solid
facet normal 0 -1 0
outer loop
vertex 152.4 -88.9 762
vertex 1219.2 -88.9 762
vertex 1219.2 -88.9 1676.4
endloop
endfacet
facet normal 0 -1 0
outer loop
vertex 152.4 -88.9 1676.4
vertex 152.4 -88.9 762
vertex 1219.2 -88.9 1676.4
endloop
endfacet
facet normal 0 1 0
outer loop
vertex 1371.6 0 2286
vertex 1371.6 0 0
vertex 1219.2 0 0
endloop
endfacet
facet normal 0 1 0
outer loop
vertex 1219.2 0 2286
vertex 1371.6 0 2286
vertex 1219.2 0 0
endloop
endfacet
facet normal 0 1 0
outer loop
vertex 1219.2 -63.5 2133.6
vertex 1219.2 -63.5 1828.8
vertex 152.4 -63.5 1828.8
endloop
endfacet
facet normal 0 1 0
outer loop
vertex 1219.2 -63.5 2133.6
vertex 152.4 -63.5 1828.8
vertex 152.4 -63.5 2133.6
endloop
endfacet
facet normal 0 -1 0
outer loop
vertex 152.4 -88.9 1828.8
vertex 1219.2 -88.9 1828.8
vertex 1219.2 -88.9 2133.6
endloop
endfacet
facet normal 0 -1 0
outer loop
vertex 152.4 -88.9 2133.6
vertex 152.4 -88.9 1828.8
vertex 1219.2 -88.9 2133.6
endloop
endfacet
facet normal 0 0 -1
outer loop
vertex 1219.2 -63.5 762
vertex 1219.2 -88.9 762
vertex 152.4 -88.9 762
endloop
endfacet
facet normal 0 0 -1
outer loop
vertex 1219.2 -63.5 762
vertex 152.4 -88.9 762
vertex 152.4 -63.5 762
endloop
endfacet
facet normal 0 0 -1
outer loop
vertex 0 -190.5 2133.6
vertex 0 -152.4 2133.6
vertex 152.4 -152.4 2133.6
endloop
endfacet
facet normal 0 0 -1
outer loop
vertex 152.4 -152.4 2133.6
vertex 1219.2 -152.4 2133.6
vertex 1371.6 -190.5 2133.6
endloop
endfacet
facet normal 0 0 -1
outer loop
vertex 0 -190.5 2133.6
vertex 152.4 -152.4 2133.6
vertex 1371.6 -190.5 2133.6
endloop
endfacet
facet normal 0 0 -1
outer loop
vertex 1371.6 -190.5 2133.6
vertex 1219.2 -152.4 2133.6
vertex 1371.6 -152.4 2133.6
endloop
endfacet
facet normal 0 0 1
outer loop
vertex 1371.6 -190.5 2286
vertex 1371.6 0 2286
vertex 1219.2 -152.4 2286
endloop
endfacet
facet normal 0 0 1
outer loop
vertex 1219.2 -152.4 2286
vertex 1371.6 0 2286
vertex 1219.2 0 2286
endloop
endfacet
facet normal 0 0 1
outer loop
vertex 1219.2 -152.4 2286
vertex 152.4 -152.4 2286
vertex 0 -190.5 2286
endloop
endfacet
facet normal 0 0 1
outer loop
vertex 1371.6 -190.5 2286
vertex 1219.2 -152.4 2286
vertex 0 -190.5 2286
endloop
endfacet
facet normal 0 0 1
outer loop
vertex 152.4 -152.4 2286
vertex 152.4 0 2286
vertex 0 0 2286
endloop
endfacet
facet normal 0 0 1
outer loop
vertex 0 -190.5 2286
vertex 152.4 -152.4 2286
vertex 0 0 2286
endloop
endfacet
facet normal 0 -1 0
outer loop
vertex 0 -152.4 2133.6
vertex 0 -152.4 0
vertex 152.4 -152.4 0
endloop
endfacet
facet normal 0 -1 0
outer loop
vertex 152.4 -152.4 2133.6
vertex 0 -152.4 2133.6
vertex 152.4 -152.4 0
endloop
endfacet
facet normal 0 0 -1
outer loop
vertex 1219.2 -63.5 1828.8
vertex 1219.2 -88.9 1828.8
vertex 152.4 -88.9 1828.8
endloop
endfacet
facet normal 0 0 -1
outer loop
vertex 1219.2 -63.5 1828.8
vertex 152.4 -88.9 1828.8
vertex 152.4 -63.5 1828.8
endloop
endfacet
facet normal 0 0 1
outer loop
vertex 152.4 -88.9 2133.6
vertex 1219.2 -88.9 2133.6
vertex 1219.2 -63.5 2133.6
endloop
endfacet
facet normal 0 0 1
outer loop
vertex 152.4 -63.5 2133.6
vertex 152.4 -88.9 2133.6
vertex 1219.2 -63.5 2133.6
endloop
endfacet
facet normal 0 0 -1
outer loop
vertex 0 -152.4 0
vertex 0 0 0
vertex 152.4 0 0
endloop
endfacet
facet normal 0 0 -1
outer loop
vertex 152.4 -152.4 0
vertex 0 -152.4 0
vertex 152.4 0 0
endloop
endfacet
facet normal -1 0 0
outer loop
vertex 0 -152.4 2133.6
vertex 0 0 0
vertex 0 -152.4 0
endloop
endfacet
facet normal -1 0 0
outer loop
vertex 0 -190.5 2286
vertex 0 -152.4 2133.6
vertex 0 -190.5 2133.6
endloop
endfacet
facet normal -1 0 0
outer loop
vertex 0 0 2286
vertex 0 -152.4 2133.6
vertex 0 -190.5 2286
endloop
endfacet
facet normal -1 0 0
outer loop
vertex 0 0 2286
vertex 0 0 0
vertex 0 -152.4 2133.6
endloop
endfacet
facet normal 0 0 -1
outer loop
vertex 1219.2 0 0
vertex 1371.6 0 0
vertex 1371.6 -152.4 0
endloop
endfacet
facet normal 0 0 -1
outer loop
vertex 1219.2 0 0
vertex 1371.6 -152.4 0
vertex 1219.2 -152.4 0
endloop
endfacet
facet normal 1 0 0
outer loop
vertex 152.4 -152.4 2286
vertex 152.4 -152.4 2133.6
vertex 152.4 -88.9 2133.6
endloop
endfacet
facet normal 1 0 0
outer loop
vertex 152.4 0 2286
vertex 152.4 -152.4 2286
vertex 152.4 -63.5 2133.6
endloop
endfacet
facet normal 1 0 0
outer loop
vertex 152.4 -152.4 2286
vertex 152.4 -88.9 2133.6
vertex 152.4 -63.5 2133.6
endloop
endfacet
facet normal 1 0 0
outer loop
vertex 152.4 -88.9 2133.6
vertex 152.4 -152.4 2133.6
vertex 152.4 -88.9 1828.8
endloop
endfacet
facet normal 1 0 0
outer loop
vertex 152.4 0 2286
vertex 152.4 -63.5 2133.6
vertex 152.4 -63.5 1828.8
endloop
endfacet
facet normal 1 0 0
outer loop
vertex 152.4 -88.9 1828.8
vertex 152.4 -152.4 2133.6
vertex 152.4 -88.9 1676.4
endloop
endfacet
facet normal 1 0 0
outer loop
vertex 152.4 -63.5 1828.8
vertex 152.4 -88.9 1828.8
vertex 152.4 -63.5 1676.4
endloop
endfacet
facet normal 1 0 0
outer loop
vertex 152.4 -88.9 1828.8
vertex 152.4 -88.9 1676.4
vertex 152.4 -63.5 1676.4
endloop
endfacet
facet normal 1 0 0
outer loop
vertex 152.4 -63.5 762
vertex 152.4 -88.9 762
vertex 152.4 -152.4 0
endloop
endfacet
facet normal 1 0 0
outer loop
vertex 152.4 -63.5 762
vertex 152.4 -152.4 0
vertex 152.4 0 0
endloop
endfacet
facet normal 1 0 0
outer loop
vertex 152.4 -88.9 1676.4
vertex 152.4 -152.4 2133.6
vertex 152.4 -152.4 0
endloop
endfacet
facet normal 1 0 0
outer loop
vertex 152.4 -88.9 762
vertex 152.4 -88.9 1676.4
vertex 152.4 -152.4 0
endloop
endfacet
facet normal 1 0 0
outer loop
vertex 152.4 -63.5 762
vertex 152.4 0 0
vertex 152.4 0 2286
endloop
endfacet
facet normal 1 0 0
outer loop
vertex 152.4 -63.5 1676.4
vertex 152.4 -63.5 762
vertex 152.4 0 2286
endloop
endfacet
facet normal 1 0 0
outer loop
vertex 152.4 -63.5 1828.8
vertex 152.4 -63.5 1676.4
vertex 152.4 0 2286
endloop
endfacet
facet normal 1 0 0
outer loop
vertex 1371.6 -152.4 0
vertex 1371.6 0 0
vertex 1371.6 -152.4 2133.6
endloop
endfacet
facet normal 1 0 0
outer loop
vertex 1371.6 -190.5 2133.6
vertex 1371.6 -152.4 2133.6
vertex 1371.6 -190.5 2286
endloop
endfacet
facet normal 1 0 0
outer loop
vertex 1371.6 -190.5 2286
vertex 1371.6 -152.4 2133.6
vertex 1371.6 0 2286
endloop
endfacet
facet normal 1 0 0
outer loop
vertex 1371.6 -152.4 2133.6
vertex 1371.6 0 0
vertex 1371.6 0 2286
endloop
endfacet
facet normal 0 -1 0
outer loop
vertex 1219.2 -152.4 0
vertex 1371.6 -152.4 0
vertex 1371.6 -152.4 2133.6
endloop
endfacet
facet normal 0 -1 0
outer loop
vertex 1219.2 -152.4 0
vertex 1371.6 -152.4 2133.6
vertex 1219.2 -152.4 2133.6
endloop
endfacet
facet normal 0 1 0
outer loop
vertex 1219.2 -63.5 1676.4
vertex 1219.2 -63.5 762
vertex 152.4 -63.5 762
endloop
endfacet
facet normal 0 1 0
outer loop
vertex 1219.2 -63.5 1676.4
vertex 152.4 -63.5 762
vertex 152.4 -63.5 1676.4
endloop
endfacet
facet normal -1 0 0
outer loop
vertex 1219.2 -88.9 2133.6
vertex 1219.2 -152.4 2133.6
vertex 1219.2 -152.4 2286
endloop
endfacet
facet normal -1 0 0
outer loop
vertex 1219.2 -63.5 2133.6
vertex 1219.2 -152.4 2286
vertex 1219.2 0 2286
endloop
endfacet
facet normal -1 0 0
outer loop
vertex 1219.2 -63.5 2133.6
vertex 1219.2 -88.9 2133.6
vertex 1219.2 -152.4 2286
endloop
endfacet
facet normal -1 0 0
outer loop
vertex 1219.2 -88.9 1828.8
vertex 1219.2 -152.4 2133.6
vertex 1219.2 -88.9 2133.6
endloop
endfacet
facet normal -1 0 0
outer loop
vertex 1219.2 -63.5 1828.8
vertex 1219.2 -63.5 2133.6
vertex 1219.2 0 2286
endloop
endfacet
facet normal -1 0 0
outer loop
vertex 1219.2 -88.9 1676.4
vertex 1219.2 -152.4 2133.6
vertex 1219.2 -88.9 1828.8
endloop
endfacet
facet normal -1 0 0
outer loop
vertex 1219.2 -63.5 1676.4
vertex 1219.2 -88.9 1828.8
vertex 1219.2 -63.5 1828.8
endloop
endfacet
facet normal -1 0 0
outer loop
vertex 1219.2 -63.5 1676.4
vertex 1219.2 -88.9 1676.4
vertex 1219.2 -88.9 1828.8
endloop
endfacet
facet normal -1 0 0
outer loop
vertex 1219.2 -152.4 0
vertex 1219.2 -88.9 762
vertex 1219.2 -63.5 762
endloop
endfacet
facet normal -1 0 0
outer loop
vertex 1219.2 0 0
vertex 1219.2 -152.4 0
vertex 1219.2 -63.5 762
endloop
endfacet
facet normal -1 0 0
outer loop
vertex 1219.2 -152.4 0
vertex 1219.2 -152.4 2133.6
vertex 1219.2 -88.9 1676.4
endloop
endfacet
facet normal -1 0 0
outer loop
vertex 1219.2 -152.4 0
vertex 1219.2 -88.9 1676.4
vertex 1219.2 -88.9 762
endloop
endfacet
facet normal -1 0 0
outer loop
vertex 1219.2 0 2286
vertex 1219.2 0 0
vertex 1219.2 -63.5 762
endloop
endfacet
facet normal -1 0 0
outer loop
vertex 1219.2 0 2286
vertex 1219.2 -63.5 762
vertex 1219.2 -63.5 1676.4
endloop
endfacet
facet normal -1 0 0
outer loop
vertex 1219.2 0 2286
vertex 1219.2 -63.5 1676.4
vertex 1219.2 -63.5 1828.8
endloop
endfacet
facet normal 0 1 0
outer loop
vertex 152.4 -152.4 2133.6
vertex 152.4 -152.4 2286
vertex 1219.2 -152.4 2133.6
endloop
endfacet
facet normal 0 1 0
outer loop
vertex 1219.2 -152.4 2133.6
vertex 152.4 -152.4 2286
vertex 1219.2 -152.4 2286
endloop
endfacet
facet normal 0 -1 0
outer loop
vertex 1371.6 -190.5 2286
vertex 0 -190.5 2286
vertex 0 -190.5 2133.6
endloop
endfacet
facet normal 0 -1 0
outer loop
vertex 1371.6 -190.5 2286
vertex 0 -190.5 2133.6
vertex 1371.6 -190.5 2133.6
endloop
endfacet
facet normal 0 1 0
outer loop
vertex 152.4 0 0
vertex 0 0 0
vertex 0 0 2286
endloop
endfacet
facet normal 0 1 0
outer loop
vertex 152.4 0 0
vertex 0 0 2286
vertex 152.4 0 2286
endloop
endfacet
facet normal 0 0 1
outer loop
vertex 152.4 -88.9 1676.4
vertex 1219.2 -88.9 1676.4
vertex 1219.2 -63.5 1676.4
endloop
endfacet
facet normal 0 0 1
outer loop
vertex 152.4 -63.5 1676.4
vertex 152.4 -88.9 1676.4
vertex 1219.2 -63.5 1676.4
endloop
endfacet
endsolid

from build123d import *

# Parameters (mm, degrees)
F0_W     = 152.4
F0_H     = 152.4
F1_DEPTH = 2286
F2_W     = 25.4
F2_H     = 914.4
F2_H_2   = 304.8
F3_DEPTH = 533.4
F5_W     = 1219.2
F5_H     = 152.4
F5_W_2   = 152.4
F6_DEPTH = 38.1


with BuildPart() as f1:
    # F0 (on Top) → F1 (new body)
    with BuildSketch(Plane.XY):
        with Locations((76.2, -76.2)):
            Rectangle(F0_W, F0_H)
    extrude(amount=F1_DEPTH)

    # F2 (on face) → F3 (join)
    with BuildSketch(Plane.YZ.offset(152.4)):
        with Locations((-76.2, 1219.2)):
            Rectangle(F2_W, F2_H)
        with Locations((-76.2, 1981.2)):
            Rectangle(F2_W, F2_H_2)
    extrude(amount=F3_DEPTH)

    # F4: F1 across face


with BuildPart() as f1_1:
    add(f1.part)
    add(f1.part.mirror(Plane(origin=(685.8, -76.2, 1219.2), x_dir=(0, 1, 0), z_dir=(1, 0, 0))))

    # F5 (on face) → F6 (join)
    with BuildSketch(Plane.XZ.offset(152.4)):
        with Locations((762, 2209.8)):
            Rectangle(F5_W, F5_H)
        with Locations((76.2, 2209.8)):
            Rectangle(F5_W_2, F5_H)
    extrude(amount=F6_DEPTH)


solid = f1_1.part
